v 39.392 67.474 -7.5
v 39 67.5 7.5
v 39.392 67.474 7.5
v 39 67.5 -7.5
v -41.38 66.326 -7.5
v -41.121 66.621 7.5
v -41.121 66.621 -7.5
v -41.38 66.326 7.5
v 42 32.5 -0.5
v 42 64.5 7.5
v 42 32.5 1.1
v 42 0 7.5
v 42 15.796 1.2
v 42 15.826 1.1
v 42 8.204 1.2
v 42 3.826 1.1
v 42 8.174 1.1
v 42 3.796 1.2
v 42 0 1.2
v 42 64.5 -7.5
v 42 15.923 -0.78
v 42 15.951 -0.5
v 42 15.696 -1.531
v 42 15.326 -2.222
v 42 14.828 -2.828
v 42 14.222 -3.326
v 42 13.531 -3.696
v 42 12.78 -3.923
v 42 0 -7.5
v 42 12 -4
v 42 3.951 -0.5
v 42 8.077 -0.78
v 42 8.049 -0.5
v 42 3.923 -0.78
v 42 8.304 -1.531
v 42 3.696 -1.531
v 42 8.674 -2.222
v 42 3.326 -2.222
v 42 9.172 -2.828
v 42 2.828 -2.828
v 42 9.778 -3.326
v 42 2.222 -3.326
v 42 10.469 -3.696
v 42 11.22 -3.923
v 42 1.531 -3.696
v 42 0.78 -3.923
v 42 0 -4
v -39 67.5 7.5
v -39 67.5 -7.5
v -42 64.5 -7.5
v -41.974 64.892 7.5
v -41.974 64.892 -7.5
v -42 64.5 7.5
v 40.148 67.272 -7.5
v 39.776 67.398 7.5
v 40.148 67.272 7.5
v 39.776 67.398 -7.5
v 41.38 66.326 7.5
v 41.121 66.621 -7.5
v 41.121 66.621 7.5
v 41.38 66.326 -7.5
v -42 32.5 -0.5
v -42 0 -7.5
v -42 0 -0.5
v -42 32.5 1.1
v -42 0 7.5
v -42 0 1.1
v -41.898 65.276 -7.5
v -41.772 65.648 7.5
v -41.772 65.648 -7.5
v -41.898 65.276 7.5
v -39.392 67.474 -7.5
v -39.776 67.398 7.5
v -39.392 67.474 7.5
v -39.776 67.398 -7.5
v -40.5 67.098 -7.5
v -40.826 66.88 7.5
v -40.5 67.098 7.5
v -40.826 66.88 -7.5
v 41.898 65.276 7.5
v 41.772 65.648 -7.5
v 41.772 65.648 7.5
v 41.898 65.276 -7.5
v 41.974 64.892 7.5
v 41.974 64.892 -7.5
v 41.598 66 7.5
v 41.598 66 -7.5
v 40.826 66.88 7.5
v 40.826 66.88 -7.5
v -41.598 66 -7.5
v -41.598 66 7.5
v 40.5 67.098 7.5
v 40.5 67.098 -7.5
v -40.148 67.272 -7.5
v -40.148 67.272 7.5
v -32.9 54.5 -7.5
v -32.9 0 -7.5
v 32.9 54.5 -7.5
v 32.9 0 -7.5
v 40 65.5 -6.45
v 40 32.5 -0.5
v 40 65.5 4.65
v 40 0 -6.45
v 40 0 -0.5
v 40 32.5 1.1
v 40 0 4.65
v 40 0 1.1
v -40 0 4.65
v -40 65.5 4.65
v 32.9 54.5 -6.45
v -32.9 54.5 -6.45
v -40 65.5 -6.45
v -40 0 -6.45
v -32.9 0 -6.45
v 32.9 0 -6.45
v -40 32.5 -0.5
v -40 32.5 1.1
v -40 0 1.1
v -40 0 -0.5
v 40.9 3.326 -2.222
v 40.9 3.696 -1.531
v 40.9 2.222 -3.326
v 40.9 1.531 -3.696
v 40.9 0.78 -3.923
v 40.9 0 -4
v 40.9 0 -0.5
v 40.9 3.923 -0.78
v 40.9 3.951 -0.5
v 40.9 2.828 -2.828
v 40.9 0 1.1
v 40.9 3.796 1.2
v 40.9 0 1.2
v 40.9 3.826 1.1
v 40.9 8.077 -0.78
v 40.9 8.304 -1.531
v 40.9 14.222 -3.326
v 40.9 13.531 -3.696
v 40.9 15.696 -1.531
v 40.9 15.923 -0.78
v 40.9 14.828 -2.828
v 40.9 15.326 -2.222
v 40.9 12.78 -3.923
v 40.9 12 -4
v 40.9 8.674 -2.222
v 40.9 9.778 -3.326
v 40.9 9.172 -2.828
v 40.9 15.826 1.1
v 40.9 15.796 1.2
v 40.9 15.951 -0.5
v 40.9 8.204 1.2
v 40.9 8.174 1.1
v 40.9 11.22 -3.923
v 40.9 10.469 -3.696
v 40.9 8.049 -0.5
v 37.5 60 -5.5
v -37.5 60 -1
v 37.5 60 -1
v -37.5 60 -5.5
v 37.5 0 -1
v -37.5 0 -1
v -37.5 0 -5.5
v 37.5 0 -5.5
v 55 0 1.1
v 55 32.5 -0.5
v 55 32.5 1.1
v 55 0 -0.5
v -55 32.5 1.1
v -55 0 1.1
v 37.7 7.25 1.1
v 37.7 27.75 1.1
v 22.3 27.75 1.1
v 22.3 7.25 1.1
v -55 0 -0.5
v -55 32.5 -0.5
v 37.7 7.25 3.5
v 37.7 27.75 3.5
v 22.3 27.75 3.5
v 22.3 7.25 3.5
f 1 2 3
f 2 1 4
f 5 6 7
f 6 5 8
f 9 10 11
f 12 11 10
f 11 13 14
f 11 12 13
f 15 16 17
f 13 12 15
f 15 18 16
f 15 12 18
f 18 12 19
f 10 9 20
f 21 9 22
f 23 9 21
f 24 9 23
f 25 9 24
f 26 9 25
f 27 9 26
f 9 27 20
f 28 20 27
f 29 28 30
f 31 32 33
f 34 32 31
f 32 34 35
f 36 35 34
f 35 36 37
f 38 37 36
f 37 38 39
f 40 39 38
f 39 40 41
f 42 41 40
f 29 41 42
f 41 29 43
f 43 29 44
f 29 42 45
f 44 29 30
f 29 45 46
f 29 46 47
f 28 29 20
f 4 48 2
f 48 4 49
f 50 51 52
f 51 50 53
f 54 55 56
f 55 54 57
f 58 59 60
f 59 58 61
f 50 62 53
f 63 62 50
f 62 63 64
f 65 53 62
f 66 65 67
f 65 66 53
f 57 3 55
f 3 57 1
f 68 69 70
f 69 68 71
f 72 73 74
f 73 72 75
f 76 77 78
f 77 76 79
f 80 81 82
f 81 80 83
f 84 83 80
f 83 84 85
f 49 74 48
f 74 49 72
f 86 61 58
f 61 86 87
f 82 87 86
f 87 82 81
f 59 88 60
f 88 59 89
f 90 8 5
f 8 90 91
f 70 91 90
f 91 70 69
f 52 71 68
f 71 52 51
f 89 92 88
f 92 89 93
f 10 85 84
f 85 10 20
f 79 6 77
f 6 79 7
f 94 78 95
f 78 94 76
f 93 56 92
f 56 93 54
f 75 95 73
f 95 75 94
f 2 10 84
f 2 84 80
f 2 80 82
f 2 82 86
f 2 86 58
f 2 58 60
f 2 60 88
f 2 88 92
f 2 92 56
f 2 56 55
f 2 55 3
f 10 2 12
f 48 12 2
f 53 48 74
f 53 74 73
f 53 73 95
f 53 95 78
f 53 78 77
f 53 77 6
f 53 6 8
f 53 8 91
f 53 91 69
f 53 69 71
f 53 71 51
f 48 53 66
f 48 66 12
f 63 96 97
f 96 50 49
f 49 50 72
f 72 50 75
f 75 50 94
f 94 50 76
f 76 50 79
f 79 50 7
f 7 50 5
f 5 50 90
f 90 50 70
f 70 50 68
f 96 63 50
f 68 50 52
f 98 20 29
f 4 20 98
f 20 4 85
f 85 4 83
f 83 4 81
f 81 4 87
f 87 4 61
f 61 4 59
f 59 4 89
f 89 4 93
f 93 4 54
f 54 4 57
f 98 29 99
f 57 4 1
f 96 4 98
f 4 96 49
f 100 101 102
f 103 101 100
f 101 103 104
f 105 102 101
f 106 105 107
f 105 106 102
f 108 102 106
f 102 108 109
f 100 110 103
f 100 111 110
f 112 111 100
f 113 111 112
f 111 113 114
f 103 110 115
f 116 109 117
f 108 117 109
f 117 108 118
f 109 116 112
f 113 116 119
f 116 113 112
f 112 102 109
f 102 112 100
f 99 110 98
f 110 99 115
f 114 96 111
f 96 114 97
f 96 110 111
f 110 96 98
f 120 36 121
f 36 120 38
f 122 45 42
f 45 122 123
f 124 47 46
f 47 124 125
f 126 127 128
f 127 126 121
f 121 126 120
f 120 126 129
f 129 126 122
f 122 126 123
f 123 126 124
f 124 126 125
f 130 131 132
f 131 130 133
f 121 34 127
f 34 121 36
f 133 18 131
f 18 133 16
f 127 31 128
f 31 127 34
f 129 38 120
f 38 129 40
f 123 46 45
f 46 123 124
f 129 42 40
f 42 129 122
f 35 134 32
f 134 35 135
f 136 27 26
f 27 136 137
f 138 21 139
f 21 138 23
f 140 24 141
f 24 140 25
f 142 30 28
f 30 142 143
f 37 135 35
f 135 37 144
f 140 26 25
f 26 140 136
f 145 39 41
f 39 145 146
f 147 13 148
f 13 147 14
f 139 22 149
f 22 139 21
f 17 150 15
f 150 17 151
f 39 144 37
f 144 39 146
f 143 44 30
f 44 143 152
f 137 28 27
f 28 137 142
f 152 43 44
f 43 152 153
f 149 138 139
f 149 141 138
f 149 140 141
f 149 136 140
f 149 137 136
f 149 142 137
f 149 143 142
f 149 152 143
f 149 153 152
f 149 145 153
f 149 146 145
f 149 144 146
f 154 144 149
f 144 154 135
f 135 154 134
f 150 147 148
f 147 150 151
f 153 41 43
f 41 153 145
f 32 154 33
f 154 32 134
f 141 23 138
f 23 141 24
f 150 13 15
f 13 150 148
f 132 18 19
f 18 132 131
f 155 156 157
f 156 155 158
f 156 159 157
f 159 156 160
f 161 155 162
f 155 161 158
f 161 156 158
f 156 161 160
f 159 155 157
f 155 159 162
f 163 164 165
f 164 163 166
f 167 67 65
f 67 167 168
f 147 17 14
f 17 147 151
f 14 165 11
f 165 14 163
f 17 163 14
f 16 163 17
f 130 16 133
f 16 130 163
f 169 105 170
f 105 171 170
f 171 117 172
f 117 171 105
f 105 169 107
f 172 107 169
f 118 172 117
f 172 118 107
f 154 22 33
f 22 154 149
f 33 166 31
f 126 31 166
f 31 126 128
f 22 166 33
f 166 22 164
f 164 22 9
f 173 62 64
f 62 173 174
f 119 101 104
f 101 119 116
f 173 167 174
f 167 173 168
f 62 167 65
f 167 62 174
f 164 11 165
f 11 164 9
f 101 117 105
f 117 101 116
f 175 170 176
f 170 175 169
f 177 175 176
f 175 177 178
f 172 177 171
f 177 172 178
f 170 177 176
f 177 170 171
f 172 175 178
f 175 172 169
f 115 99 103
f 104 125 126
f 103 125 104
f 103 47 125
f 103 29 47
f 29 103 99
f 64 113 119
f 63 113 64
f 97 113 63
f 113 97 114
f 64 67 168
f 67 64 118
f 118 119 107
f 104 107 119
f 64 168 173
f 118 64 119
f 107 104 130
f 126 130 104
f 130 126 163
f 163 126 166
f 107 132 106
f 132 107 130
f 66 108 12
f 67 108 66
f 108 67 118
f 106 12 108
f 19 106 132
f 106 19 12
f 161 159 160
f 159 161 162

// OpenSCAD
intersection() {
	union() {
		color(alpha = 0.9, c = "LightGray") {
			difference() {
				difference() {
					difference() {
						difference() {
							difference() {
								hull() {
									translate(v = [-39.0, -64.5, 0]) {
										cylinder($fn = 48, center = true, h = 15.0, r = 3.0);
									}
									translate(v = [-39.0, 64.5, 0]) {
										cylinder($fn = 48, center = true, h = 15.0, r = 3.0);
									}
									translate(v = [39.0, -64.5, 0]) {
										cylinder($fn = 48, center = true, h = 15.0, r = 3.0);
									}
									translate(v = [39.0, 64.5, 0]) {
										cylinder($fn = 48, center = true, h = 15.0, r = 3.0);
									}
								}
								translate(v = [0, 0, -0.9]) {
									cube(center = true, size = [80.0, 131.0, 11.1]);
								}
							}
							translate(v = [0, 0, -3.0]) {
								cube(center = true, size = [75.4, 120.4, 5.1]);
							}
						}
						translate(v = [0, 0, -6.5]) {
							cube(center = true, size = [65.8, 109.0, 2.2]);
						}
					}
					union() {
						translate(v = [42.0, -12.0, 0]) {
							rotate(a = [0, 90, 0]) {
								cylinder($fn = 32, center = true, d = 8.0, h = 2.2);
							}
						}
						translate(v = [42.0, 0.0, 0]) {
							rotate(a = [0, 90, 0]) {
								cylinder($fn = 32, center = true, d = 8.0, h = 2.2);
							}
						}
						translate(v = [42.0, 12.0, 0]) {
							rotate(a = [0, 90, 0]) {
								cylinder($fn = 32, center = true, d = 8.0, h = 2.2);
							}
						}
					}
				}
				translate(v = [0, -67.5, 0]) {
					rotate(a = [90, 0, 0]) {
						linear_extrude(center = true, height = 15.2) {
							hull() {
								translate(v = [-2.84, 0]) {
									circle($fn = 32, r = 2.0300000000000002);
								}
								translate(v = [2.84, 0]) {
									circle($fn = 32, r = 2.0300000000000002);
								}
							}
						}
					}
				}
			}
		}
		color(alpha = 0.85, c = "DarkGray") {
			difference() {
				difference() {
					translate(v = [0, 0, 4.35]) {
						hull() {
							translate(v = [-39.0, -64.5, 0]) {
								cylinder($fn = 48, center = true, h = 6.3, r = 3.0);
							}
							translate(v = [-39.0, 64.5, 0]) {
								cylinder($fn = 48, center = true, h = 6.3, r = 3.0);
							}
							translate(v = [39.0, -64.5, 0]) {
								cylinder($fn = 48, center = true, h = 6.3, r = 3.0);
							}
							translate(v = [39.0, 64.5, 0]) {
								cylinder($fn = 48, center = true, h = 6.3, r = 3.0);
							}
						}
					}
					translate(v = [0, 0, 3.3500000000000005]) {
						cube(center = true, size = [80.0, 131.0, 4.3999999999999995]);
					}
				}
				translate(v = [0, 0.7999999999999972, 6.35]) {
					cube(center = true, size = [50.6, 120.6, 2.4]);
				}
			}
		}
		translate(v = [0, 0, -3.25]) {
			rotate(a = [0, 0, 90]) {
				union() {
					color(alpha = 0.5, c = "DodgerBlue") {
						cube(center = true, size = [120.0, 75.0, 4.5]);
					}
					color(alpha = 0.7, c = "LightBlue") {
						translate(v = [0, 0, 1.75]) {
							cube(center = true, size = [108.0, 64.8, 1.0]);
						}
					}
				}
			}
		}
		translate(v = [0, 0, 0.30000000000000004]) {
			union() {
				color(alpha = 0.5, c = "ForestGreen") {
					cube(center = true, size = [110.0, 65.0, 1.6]);
				}
				color(alpha = 0.6, c = "DarkGreen") {
					translate(v = [30.0, 17.5, 2.0]) {
						cube(center = true, size = [15.4, 20.5, 2.4]);
					}
				}
			}
		}
	}
	translate(v = [0, 250.0, 0]) {
		cube(center = true, size = [1000, 500, 1000]);
	}
}
